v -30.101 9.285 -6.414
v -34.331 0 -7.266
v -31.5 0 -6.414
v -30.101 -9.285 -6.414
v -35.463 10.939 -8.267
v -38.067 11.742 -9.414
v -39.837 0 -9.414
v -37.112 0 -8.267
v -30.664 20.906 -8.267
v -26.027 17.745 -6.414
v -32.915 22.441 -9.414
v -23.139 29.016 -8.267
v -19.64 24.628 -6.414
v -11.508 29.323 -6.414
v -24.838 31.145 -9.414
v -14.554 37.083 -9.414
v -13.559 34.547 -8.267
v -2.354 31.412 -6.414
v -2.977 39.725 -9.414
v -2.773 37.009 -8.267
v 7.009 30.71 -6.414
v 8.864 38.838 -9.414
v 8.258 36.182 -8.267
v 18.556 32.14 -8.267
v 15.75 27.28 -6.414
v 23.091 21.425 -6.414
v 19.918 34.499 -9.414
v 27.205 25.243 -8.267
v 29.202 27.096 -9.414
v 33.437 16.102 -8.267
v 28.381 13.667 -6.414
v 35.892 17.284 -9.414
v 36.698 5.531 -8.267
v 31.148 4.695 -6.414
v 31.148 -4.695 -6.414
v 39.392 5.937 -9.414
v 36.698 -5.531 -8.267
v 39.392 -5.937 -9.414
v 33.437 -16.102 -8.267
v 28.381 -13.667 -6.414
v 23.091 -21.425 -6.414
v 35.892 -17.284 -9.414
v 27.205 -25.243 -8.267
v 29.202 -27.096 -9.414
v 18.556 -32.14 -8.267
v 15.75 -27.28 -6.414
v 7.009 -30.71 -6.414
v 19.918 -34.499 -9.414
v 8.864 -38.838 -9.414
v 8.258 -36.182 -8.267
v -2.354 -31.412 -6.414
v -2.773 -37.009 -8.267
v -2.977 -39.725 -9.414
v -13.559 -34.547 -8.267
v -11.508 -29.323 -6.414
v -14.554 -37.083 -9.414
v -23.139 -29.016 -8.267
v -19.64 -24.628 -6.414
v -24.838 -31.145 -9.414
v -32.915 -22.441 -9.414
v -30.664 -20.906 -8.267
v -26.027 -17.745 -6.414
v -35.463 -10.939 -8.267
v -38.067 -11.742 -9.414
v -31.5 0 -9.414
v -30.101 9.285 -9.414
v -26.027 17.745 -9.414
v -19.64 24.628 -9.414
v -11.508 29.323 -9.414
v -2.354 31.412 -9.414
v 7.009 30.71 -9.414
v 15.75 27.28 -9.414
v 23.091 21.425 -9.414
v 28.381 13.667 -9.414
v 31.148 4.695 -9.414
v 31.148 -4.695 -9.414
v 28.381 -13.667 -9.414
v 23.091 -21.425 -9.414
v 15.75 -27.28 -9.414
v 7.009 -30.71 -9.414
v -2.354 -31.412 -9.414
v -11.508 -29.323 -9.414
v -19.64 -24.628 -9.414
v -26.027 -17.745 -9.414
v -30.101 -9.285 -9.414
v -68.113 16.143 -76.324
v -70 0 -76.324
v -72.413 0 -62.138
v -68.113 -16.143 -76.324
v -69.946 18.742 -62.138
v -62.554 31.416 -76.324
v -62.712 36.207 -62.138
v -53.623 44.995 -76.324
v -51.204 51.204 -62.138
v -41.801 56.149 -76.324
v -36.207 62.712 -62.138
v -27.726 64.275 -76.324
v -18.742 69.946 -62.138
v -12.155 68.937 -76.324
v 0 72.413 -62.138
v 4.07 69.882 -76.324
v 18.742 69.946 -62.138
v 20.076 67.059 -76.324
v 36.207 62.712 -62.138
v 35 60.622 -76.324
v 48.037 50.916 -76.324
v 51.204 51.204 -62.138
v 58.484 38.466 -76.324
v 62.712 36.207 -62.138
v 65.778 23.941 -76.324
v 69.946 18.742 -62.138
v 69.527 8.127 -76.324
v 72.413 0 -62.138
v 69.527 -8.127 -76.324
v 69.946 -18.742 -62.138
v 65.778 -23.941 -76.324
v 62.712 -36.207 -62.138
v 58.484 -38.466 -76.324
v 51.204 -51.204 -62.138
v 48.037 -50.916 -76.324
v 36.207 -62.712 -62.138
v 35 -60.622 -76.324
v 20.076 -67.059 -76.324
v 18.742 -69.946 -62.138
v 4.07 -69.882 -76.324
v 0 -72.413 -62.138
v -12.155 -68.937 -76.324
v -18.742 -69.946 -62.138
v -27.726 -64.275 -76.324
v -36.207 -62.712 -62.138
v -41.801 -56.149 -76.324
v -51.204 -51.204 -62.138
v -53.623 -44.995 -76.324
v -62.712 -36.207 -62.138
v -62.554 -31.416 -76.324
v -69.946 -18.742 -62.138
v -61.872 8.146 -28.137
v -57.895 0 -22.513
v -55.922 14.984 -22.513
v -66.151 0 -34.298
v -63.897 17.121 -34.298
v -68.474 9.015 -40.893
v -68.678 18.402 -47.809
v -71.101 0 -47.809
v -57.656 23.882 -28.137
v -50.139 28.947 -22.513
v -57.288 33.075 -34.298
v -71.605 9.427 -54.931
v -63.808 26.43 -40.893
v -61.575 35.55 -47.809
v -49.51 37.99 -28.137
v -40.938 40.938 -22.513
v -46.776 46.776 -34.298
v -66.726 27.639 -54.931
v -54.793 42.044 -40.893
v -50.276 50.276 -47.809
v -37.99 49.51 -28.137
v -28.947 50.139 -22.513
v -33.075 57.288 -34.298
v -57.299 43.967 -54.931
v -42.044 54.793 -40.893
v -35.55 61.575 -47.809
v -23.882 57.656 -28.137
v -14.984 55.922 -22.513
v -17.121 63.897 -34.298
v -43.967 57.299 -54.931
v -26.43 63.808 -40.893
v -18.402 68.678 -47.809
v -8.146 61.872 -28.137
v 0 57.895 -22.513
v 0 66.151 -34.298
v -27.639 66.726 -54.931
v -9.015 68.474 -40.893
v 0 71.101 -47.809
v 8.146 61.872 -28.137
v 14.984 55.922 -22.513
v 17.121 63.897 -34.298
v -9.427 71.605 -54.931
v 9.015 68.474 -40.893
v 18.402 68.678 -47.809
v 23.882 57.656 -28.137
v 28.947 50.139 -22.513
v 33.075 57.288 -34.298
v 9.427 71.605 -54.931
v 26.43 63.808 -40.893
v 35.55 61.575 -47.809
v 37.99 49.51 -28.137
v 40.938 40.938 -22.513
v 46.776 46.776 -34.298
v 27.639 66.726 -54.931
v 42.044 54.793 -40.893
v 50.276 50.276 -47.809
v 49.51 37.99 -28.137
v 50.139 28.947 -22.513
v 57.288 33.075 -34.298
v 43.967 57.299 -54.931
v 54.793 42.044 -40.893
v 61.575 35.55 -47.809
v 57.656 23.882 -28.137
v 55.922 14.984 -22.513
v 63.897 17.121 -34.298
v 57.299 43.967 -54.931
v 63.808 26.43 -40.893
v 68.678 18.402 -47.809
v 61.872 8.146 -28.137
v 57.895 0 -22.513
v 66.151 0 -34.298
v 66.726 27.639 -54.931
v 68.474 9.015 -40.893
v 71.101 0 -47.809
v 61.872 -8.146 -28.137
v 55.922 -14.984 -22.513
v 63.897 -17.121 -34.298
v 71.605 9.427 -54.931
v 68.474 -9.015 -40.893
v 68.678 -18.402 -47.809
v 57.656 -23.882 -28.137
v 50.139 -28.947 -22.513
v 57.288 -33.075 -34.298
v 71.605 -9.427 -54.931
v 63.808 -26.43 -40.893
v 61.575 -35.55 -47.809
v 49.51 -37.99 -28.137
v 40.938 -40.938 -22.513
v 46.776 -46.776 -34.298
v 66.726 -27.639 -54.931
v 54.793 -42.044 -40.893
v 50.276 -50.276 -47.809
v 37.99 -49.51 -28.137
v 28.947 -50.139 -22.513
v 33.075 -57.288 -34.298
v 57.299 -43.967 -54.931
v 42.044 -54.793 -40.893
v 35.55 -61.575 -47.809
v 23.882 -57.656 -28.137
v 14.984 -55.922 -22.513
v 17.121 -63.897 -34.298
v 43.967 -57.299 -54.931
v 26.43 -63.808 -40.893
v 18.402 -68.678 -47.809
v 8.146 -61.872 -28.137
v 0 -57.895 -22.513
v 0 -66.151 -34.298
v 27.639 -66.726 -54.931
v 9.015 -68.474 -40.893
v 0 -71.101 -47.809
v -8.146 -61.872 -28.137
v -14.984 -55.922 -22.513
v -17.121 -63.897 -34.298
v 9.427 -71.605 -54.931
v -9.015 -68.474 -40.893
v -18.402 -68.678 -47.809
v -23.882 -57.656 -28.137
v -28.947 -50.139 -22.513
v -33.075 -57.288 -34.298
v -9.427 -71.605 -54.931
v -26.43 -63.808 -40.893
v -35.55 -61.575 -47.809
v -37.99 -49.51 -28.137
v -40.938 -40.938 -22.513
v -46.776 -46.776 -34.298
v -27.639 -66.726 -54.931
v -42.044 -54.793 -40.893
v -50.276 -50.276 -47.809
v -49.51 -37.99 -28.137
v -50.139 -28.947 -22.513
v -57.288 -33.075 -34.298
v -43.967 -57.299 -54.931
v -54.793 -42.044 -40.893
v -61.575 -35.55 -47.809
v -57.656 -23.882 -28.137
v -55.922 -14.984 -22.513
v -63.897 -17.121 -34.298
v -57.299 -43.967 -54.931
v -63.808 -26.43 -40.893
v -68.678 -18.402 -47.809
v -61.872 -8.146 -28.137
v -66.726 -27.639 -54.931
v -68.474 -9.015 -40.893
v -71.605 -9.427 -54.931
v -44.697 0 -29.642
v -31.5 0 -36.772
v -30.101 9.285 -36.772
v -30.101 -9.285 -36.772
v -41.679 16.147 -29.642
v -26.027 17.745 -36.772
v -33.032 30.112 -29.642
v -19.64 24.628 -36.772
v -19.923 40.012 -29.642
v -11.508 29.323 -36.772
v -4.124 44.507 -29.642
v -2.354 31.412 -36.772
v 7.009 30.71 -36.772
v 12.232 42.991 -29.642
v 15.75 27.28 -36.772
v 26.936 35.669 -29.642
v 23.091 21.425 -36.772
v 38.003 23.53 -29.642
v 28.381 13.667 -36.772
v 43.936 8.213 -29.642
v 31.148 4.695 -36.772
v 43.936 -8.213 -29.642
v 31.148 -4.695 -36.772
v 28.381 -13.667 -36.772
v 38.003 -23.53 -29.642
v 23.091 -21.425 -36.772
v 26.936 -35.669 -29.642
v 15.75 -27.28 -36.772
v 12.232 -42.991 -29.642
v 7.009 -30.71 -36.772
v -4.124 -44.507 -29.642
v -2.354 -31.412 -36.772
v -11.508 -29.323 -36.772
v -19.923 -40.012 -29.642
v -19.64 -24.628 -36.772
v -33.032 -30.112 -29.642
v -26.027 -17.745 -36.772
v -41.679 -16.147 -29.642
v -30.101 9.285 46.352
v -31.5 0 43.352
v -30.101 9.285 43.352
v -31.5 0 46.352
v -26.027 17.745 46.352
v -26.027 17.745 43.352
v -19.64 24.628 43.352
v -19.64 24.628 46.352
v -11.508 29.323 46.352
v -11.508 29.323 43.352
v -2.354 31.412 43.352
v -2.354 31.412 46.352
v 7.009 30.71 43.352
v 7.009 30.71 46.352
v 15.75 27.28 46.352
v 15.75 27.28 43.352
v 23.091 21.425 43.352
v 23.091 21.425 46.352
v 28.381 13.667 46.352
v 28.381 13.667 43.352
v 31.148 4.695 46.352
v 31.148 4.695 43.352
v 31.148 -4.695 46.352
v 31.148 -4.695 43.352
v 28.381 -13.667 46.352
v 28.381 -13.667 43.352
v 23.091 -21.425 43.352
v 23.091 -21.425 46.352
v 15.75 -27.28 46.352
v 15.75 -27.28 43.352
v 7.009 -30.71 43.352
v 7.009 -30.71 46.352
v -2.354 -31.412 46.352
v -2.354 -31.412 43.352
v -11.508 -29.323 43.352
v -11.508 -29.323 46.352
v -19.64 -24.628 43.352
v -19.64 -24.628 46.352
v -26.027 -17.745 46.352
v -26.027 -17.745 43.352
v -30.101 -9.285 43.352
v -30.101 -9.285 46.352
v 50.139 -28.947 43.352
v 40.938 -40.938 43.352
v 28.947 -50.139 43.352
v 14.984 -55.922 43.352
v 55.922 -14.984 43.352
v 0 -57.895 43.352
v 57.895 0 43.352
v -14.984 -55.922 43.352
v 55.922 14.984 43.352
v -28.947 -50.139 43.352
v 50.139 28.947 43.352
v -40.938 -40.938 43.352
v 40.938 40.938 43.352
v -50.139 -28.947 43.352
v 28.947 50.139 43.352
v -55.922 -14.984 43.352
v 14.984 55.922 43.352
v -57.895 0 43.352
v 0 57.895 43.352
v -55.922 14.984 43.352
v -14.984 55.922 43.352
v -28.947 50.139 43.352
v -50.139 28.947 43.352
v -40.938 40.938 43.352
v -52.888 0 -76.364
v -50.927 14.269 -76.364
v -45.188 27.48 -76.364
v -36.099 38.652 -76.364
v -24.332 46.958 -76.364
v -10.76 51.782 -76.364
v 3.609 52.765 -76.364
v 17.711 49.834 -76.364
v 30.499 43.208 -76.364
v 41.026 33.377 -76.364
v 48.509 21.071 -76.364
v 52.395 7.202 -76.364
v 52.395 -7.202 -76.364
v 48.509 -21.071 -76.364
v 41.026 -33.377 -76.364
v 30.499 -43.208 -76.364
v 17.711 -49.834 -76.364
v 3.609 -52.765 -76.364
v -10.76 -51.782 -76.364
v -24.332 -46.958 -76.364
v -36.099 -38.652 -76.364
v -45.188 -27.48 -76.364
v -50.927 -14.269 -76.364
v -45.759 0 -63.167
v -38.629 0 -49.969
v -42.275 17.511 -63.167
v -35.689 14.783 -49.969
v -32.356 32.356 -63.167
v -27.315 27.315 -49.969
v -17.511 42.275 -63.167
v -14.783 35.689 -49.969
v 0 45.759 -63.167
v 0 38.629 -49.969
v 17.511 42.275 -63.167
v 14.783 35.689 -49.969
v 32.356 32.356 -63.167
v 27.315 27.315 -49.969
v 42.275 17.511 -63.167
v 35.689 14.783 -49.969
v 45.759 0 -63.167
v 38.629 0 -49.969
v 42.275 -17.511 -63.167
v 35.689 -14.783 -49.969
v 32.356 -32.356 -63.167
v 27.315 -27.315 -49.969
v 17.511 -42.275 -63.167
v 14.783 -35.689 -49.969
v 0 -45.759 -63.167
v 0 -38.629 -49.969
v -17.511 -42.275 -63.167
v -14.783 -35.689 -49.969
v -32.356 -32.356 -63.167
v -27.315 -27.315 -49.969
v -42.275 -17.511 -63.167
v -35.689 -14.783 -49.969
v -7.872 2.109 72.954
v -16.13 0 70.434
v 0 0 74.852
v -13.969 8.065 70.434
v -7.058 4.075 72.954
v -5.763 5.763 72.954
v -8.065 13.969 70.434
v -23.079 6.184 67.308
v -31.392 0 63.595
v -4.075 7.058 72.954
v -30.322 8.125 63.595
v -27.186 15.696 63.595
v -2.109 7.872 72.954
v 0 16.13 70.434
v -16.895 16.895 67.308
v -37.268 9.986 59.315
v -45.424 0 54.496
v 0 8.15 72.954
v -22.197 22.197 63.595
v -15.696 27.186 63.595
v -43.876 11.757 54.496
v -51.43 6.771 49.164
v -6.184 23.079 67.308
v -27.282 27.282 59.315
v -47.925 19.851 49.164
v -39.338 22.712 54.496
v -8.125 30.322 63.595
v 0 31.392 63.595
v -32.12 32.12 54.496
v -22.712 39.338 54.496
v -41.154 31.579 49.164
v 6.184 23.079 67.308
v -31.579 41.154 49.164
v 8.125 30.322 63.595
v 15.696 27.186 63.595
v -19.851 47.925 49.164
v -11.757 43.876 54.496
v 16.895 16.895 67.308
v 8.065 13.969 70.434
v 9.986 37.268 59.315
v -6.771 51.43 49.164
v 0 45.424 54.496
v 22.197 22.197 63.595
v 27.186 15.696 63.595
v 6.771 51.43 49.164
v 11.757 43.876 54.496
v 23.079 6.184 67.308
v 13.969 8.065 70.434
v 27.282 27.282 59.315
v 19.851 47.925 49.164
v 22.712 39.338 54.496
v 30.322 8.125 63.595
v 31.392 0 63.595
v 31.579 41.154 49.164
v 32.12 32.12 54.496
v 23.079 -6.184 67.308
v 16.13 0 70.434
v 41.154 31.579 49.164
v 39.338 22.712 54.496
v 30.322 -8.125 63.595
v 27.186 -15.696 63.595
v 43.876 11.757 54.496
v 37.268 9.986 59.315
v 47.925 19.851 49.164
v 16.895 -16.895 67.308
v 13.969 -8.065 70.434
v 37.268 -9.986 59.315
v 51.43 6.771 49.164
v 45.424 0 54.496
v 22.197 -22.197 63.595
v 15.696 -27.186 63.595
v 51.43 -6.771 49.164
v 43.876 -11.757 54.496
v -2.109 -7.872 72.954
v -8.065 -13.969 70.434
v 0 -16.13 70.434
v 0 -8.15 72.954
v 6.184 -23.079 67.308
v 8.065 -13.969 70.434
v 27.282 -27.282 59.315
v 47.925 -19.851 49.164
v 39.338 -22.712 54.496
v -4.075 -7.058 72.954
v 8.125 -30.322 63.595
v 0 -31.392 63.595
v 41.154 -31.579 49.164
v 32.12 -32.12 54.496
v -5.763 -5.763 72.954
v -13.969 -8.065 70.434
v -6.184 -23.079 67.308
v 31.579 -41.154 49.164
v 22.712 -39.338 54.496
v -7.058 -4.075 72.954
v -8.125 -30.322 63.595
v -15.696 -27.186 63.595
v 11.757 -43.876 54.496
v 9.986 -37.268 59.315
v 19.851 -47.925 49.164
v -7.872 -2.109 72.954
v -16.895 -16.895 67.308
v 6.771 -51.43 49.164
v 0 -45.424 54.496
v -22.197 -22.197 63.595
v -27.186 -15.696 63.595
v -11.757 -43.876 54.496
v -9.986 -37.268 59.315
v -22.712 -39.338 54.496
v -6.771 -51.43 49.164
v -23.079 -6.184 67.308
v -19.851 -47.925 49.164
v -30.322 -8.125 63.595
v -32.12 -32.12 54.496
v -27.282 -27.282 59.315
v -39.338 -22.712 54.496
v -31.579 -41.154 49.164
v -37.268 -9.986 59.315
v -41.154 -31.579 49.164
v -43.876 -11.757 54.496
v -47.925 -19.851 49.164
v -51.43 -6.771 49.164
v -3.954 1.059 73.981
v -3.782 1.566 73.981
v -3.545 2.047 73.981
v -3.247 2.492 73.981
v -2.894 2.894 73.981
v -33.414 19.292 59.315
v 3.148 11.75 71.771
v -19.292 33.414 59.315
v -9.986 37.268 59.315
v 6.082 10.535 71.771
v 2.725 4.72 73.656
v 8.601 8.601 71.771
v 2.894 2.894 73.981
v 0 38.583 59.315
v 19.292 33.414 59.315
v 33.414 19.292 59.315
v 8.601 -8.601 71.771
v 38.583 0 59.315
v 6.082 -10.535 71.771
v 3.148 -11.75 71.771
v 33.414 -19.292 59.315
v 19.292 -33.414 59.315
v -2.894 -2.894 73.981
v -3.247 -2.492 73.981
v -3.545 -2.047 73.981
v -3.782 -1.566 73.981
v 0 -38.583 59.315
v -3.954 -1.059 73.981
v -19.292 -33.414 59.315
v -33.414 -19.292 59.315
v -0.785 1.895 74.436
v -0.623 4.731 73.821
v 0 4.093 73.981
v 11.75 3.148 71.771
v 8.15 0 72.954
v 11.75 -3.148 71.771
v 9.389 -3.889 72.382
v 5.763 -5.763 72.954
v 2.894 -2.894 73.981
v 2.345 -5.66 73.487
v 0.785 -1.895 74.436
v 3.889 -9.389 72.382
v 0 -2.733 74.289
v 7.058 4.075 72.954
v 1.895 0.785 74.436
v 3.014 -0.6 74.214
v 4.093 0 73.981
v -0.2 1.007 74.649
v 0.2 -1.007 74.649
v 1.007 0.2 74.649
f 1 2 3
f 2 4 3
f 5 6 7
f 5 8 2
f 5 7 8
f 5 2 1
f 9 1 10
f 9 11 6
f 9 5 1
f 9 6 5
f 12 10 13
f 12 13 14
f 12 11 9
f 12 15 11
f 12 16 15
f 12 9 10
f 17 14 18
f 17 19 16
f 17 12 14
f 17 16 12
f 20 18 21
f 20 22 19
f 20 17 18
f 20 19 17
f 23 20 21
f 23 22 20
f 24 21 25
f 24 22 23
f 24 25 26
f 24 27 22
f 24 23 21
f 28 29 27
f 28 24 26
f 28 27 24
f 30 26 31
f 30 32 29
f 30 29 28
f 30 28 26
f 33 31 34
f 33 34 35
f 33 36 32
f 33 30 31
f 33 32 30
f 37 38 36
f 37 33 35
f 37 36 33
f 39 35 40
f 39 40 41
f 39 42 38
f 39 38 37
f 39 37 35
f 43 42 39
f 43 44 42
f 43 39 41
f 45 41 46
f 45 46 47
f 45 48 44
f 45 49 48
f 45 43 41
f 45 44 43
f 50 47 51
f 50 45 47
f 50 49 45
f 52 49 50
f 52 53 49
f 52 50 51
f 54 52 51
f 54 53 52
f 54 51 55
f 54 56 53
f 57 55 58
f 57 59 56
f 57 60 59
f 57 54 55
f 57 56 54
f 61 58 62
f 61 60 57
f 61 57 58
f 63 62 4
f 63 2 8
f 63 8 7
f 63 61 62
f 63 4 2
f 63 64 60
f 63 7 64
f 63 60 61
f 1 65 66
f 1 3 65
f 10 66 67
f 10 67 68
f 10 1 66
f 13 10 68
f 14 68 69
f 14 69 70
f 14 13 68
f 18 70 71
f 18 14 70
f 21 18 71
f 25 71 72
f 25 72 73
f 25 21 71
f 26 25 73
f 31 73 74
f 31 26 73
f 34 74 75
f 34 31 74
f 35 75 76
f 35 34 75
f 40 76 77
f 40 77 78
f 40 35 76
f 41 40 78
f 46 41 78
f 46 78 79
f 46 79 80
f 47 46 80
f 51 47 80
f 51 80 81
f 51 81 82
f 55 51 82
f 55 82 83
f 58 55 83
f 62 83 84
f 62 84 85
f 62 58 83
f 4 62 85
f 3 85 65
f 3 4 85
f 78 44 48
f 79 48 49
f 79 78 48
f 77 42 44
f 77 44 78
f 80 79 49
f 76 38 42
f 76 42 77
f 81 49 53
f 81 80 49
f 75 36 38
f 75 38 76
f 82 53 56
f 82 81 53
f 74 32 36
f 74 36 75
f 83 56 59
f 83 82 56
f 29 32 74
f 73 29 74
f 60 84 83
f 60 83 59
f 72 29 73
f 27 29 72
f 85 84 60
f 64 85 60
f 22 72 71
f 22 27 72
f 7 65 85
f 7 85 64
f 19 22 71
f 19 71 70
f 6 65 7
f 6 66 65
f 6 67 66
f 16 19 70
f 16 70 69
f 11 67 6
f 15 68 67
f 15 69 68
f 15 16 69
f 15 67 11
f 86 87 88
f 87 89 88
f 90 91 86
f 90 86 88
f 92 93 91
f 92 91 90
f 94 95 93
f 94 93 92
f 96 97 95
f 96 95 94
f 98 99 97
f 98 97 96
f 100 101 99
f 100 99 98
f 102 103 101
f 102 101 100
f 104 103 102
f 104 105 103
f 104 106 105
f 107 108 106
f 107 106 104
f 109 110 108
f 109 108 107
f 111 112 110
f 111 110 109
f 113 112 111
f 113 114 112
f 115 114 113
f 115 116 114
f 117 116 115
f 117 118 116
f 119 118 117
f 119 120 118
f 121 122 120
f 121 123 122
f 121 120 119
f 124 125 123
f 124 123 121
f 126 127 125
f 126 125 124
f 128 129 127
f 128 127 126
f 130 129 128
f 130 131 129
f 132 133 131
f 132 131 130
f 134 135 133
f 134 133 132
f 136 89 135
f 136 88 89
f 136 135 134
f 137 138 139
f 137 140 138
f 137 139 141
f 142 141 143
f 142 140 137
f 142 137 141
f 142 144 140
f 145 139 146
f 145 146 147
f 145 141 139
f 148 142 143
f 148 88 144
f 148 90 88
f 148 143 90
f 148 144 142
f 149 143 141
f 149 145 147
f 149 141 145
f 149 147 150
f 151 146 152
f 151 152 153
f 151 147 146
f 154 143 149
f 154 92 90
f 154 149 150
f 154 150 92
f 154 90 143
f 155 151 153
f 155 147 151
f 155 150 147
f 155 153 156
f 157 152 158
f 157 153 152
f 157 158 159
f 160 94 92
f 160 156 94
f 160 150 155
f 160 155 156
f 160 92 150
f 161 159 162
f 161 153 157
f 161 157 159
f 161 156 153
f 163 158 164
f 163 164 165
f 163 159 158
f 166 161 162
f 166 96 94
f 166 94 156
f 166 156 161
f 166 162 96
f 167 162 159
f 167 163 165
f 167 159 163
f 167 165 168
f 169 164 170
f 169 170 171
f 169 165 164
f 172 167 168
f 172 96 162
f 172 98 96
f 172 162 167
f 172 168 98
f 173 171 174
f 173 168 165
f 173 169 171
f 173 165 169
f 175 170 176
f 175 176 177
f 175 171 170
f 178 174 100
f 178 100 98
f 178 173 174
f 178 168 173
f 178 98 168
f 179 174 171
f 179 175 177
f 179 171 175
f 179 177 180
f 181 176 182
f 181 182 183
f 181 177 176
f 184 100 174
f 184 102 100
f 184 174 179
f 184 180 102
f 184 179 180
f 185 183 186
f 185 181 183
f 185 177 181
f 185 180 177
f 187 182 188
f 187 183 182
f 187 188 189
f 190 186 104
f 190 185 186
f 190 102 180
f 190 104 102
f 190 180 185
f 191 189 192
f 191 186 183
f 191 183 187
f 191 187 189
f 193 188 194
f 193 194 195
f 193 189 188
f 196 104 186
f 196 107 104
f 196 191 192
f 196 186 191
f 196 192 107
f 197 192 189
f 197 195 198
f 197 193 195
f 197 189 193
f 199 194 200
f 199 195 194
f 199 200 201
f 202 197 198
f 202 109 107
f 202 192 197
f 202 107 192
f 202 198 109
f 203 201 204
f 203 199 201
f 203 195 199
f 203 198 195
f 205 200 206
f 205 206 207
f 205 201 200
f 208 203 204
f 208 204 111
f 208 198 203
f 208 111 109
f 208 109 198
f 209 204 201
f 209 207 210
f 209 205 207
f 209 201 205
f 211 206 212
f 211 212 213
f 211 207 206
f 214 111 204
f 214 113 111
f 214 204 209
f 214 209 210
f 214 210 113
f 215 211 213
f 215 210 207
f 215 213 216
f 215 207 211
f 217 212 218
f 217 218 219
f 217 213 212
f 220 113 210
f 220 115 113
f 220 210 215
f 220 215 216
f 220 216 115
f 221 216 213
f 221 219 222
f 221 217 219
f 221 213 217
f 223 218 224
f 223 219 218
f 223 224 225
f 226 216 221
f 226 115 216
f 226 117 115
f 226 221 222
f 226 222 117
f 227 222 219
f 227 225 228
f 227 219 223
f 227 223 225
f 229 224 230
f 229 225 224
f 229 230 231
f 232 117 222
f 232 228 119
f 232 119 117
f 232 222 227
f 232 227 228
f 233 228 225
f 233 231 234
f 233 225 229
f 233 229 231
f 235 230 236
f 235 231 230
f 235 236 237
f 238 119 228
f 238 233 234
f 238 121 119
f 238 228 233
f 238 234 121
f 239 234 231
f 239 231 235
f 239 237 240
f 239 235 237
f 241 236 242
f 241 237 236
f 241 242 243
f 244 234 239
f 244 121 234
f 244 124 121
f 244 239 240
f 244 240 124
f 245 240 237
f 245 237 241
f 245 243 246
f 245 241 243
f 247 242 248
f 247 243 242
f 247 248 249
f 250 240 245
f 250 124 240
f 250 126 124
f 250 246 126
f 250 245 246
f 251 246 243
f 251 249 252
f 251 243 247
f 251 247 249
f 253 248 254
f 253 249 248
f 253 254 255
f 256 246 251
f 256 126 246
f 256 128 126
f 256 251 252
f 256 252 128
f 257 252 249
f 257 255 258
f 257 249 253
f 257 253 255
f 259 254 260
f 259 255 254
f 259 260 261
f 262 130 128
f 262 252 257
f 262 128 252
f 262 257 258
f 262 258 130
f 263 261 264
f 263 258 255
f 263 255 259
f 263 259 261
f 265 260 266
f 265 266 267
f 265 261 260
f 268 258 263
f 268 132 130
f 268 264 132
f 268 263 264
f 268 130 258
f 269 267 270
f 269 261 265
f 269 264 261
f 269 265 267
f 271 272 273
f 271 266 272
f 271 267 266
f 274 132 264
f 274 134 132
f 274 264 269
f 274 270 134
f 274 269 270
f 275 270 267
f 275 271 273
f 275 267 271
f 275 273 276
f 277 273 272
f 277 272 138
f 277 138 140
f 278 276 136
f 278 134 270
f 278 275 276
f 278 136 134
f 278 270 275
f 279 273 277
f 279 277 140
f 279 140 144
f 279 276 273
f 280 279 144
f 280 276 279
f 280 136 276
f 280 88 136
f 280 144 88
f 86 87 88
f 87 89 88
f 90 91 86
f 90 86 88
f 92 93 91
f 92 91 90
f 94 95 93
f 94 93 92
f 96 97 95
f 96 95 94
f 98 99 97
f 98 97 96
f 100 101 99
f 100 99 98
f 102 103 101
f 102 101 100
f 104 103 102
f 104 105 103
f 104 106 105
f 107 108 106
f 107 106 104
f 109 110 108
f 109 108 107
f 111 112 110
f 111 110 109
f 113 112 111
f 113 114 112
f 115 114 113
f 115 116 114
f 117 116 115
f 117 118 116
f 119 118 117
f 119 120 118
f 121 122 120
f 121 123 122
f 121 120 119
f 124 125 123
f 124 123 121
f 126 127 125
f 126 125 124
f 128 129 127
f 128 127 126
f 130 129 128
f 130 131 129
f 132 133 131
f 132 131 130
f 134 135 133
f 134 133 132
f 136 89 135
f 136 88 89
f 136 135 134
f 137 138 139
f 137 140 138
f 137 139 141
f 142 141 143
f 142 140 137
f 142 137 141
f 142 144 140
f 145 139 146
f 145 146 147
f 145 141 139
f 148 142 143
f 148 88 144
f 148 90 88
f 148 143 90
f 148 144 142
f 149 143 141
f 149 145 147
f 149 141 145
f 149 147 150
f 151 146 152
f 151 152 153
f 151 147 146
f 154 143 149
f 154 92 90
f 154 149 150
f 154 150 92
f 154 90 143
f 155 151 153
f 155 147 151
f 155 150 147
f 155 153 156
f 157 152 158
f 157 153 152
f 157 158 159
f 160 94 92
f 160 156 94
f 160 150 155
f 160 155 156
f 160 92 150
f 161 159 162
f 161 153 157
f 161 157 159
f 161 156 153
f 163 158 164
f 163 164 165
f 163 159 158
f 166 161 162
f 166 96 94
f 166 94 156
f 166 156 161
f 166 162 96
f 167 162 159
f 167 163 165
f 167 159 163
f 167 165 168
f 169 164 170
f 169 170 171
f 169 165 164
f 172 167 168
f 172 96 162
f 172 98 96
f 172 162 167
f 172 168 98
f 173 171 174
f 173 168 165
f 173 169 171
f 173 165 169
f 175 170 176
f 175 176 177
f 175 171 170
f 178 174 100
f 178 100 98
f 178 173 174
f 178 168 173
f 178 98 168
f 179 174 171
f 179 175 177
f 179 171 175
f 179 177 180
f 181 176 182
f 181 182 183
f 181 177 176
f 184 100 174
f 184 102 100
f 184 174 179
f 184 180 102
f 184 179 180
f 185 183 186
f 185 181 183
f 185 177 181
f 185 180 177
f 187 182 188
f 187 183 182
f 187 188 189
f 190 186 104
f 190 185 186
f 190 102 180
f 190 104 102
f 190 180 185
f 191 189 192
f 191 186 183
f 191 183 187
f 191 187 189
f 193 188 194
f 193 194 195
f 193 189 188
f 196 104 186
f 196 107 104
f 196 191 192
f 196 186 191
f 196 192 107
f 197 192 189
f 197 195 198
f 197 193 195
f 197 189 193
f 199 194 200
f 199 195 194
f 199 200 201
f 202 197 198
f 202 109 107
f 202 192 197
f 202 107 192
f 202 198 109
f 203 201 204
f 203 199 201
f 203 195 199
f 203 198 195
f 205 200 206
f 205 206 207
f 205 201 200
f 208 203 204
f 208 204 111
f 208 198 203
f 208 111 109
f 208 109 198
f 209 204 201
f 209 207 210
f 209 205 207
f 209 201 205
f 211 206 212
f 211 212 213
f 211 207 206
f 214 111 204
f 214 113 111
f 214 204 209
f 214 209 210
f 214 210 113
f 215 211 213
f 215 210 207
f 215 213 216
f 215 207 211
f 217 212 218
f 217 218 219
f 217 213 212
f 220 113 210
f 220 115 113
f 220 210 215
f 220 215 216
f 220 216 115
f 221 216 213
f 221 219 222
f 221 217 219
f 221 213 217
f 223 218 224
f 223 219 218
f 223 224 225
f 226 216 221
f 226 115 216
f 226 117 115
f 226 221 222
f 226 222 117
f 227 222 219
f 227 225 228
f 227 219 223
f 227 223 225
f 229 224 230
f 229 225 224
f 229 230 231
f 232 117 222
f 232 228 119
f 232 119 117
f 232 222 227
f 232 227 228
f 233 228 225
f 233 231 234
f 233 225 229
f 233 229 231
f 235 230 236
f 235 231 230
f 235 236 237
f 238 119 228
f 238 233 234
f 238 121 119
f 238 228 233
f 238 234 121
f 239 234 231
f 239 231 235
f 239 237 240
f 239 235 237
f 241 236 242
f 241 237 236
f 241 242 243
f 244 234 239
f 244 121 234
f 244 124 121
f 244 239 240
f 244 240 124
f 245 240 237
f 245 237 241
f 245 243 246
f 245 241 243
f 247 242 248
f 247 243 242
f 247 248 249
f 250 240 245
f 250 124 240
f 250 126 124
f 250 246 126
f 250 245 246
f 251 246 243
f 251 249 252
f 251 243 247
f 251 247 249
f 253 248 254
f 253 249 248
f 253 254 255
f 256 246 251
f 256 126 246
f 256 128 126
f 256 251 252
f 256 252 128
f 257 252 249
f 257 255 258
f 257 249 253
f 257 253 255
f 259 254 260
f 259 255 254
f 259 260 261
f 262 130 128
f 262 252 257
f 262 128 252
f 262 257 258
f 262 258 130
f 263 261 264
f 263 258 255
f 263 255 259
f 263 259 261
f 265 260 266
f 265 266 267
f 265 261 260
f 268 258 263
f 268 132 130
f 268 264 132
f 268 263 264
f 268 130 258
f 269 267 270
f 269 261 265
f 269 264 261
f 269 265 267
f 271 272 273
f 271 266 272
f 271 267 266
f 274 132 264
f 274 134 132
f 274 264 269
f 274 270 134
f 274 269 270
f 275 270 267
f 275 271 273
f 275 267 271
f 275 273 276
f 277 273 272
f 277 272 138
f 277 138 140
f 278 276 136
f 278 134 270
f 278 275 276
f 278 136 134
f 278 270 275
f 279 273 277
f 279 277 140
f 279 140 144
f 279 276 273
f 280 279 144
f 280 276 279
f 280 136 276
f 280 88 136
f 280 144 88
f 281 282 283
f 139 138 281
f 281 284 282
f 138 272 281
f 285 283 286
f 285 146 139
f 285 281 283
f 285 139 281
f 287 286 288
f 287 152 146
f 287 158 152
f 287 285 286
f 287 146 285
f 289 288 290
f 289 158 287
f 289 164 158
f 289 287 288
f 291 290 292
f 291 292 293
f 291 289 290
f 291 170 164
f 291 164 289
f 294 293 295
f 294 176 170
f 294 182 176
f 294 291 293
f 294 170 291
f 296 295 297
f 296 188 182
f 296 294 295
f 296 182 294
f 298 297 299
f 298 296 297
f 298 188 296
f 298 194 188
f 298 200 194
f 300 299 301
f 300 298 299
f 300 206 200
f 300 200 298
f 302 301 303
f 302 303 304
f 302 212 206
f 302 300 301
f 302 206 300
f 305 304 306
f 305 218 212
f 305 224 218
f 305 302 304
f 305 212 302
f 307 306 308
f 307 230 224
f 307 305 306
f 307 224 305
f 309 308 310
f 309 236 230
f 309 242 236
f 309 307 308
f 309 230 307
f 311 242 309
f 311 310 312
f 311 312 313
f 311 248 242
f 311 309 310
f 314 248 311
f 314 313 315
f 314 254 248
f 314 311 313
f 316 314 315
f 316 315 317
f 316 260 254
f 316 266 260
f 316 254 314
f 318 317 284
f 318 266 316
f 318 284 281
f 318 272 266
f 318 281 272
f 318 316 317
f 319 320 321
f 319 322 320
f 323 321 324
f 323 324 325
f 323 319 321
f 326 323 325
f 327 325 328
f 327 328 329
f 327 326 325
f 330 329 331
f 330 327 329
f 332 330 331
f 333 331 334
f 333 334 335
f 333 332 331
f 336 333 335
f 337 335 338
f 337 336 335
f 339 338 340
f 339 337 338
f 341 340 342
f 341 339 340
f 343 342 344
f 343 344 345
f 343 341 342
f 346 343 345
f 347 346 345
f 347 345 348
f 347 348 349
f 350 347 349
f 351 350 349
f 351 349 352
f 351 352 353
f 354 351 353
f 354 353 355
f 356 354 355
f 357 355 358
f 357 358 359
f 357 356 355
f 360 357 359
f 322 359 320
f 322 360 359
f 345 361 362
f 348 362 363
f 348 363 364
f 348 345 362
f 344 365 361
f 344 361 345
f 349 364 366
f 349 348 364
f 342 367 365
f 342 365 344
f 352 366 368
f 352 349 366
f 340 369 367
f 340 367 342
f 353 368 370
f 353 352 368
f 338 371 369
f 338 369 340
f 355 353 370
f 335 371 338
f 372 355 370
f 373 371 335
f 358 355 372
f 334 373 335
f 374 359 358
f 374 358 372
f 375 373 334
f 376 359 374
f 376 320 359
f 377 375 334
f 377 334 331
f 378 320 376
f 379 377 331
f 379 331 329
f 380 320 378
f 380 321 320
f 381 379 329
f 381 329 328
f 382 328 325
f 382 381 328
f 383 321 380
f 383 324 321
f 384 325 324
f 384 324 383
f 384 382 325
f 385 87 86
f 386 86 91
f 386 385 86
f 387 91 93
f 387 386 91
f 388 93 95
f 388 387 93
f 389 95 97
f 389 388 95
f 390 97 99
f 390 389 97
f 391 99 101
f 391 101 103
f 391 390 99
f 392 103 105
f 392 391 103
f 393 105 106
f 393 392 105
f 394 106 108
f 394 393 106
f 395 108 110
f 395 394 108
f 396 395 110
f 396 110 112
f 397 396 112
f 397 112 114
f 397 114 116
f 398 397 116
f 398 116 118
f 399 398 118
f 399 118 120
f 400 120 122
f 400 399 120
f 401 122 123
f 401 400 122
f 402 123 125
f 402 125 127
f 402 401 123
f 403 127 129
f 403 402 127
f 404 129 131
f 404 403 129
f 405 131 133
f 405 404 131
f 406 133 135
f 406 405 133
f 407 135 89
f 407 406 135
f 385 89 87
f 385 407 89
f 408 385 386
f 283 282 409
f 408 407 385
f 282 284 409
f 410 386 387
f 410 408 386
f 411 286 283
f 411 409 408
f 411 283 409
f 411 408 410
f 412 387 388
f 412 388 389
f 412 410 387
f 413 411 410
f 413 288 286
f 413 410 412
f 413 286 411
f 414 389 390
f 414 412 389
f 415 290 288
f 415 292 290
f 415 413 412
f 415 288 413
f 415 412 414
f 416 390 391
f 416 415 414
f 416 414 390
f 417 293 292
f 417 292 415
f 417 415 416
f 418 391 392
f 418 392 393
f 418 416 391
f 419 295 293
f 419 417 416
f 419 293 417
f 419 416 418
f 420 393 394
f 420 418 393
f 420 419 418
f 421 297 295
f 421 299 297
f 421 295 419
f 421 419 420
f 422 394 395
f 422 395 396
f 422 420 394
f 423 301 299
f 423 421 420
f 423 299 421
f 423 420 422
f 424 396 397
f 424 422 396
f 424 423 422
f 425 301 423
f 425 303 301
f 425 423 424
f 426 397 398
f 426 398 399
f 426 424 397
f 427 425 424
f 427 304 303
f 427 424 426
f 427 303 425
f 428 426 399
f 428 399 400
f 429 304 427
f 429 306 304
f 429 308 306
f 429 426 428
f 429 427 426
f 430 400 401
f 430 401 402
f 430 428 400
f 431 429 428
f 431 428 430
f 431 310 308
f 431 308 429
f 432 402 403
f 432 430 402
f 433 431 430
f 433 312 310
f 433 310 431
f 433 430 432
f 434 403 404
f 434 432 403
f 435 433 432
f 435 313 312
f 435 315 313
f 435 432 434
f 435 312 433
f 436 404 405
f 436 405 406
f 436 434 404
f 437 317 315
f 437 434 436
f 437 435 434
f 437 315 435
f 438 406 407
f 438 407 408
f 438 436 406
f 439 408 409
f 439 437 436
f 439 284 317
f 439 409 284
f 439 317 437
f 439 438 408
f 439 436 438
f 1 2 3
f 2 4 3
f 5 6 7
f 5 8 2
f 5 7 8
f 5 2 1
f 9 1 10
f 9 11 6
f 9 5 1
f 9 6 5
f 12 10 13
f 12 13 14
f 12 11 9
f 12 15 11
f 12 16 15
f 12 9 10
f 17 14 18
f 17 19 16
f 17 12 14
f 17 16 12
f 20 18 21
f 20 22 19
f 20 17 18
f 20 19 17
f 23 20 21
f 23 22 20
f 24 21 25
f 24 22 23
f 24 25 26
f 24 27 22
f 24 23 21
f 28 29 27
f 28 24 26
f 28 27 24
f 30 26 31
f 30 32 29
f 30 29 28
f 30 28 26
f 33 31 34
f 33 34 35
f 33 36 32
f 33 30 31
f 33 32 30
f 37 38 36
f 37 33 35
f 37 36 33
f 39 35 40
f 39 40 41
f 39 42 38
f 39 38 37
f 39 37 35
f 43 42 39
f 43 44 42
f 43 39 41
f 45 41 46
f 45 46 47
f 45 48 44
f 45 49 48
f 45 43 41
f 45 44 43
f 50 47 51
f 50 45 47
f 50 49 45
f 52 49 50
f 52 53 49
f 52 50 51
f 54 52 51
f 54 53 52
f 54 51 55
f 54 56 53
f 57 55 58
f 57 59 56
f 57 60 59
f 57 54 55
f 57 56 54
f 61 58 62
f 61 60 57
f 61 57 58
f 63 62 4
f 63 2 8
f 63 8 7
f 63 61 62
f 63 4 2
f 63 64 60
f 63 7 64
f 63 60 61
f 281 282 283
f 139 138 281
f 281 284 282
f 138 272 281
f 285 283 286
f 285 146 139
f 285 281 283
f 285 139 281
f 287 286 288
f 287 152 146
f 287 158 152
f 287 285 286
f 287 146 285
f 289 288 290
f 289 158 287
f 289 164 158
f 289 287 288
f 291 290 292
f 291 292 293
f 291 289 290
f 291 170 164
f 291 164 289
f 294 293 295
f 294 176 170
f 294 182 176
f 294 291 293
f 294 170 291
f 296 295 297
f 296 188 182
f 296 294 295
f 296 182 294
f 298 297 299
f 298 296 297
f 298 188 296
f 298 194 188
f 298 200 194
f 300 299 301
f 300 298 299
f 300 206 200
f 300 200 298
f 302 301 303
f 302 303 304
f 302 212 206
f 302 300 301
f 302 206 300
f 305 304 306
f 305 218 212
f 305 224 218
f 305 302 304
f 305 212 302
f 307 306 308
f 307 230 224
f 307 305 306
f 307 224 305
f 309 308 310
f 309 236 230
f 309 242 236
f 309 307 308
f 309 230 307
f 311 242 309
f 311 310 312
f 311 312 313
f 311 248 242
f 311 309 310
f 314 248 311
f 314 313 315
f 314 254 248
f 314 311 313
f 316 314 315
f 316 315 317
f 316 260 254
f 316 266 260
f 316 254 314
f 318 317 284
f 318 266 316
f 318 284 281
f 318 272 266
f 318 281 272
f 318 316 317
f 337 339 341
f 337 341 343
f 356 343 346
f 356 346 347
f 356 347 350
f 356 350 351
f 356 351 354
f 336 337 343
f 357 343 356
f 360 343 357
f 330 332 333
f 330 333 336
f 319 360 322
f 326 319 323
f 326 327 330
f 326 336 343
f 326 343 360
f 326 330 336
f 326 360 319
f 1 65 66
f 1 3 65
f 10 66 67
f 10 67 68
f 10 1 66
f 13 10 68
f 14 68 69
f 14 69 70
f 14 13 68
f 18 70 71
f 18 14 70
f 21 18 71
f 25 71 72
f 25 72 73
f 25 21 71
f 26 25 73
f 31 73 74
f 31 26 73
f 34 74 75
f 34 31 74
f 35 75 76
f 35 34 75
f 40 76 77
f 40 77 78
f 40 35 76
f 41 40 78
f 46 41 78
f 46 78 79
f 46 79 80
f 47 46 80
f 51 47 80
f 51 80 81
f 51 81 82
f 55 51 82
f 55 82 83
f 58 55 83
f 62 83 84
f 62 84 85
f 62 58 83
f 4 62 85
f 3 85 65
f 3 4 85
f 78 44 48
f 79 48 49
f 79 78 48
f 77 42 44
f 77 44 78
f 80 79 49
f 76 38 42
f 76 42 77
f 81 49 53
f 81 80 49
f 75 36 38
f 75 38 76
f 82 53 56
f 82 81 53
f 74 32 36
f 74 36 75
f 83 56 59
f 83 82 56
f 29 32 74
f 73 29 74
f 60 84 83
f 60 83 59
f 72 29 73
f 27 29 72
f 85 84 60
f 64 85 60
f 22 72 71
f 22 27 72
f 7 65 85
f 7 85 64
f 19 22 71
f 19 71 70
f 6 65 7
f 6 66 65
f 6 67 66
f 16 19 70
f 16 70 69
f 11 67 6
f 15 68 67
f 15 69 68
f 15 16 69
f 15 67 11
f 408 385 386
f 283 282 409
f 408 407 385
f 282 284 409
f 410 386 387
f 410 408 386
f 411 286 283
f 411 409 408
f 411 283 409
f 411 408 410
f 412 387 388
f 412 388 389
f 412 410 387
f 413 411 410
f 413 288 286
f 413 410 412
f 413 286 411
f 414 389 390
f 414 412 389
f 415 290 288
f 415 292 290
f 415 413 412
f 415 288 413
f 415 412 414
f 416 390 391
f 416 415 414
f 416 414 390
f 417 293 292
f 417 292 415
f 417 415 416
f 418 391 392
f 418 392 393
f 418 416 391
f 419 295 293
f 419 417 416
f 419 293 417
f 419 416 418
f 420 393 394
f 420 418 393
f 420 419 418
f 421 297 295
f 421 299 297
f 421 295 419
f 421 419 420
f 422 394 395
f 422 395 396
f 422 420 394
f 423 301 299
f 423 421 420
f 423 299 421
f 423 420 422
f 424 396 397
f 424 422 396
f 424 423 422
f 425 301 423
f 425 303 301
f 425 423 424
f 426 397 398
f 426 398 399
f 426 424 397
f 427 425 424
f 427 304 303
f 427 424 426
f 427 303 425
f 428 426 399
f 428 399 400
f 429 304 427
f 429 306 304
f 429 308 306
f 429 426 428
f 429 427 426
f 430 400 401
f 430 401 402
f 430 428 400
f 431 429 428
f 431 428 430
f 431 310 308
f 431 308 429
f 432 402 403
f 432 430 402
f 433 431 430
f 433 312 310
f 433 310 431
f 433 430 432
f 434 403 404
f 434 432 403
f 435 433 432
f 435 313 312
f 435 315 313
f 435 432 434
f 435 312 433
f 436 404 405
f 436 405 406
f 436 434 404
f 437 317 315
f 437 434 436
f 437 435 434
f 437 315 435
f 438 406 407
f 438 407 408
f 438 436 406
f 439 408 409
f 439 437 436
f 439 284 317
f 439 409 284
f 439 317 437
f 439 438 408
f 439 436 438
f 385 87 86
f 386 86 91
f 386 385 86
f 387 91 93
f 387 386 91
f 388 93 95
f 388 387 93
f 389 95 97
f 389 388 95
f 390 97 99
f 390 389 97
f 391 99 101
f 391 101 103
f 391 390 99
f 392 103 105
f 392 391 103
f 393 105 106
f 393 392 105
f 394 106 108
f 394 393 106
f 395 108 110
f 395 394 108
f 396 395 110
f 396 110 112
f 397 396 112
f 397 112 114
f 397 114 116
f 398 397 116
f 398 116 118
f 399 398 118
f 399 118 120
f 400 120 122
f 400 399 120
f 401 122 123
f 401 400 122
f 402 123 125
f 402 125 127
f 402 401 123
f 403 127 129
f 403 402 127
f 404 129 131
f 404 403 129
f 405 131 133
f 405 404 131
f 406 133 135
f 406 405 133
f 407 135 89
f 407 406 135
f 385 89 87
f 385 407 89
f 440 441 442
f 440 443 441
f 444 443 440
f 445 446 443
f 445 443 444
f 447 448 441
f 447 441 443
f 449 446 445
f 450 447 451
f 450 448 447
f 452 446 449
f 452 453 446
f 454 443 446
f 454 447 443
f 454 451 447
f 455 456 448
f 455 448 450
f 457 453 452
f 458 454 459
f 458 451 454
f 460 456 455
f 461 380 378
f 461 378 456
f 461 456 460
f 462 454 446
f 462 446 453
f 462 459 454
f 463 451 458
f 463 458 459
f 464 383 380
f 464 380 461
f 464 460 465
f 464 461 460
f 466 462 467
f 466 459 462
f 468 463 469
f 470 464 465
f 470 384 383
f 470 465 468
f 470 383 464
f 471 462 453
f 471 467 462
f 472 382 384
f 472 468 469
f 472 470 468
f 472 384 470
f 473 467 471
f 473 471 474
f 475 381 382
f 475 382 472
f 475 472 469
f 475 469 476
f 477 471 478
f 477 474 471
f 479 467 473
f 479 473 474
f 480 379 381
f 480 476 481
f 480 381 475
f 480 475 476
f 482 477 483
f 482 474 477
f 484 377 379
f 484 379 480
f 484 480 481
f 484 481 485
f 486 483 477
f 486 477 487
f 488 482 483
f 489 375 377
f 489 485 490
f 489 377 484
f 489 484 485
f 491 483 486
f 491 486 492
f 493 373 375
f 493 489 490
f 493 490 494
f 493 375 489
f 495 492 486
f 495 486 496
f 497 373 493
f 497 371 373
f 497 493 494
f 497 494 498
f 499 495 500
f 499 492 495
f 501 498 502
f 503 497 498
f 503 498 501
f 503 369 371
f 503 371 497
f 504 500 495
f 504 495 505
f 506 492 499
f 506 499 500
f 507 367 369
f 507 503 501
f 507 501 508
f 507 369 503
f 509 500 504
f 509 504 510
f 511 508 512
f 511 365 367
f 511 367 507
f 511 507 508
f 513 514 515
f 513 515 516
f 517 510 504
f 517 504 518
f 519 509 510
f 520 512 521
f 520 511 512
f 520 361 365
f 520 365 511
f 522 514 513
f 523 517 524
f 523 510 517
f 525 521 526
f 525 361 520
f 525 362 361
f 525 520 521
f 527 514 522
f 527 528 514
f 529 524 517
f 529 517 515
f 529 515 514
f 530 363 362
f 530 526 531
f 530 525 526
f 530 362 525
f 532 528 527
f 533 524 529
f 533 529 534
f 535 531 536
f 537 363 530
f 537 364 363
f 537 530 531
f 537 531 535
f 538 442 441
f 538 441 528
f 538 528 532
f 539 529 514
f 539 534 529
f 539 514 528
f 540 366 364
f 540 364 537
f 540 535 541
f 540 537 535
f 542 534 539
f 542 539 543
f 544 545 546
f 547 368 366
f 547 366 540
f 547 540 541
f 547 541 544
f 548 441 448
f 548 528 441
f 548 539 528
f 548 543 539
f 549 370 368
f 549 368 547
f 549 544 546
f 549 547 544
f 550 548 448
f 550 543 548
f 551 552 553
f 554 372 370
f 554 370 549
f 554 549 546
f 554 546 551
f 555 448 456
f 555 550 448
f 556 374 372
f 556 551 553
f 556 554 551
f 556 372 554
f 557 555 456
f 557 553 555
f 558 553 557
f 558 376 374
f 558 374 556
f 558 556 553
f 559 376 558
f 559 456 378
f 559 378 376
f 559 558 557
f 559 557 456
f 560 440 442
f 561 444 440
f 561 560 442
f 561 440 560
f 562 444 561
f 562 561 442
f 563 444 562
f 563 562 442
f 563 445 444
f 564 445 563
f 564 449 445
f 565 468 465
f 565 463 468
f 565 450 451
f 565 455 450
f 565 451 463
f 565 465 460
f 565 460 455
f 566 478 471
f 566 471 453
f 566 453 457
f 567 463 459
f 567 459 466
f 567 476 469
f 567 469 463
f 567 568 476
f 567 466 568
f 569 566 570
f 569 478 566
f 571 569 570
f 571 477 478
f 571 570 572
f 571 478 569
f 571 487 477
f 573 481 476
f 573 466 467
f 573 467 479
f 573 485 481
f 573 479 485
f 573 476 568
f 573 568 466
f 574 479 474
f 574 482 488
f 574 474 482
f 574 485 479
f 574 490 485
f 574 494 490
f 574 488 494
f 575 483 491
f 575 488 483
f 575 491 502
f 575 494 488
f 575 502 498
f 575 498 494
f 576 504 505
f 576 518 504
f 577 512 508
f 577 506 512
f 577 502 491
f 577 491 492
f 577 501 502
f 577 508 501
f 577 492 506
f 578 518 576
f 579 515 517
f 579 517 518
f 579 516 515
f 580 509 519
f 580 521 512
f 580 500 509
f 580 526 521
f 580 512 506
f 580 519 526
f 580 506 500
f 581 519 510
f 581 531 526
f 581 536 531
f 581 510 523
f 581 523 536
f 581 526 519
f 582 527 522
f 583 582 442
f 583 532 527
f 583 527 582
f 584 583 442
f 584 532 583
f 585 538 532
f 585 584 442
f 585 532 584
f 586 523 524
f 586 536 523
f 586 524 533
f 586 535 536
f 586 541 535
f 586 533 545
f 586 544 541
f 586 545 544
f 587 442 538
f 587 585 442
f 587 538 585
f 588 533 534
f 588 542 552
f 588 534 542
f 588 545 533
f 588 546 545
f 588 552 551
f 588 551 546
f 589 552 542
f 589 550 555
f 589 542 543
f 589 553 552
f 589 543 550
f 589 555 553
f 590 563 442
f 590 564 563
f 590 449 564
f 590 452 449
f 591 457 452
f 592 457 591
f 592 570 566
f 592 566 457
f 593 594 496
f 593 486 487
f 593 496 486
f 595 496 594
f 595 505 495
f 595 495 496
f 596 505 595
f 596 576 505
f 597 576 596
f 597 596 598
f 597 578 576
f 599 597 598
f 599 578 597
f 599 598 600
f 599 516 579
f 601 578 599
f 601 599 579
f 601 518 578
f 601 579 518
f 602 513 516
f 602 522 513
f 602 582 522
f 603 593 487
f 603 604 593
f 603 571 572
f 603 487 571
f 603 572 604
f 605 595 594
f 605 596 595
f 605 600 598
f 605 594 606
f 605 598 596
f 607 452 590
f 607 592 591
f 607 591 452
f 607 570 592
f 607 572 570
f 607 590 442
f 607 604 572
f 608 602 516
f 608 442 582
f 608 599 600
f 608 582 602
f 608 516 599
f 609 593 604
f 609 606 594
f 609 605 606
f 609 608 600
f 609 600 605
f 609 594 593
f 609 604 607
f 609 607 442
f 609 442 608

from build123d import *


# Not quite as in the source:
# - the program builds the solid bodies; features that only make, move or delete a surface that nothing else refers to are left out


with BuildPart() as f1:
    # F0 (on Front) → F1 (revolve)
    with BuildSketch(Plane.XZ):
        with BuildLine():
            Line((-31.5, -36.7715619504), (-57.8949571854, -22.5130124036))
            ThreePointArc((-57.8949571854, -22.5130124036), (-71.100893869, -47.8091979463), (-70, -76.3237871839))
            Line((-70, -76.3237871839), (-52.8878243203, -76.3639977286))
            Line((-52.8878243203, -76.3639977286), (-31.5, -36.7715619504))
        make_face()
    revolve(axis=Axis((0, 0, -0.7809376717), (0, 0, -1)))


with BuildPart() as f3:
    # F0 (on Front) → F3 (revolve)
    with BuildSketch(Plane.XZ):
        with BuildLine():
            Line((-31.5, -9.4140620232), (-31.5, -6.4140620232))
            ThreePointArc((-31.5, -6.4140620232), (-35.7282093513, -7.7475284985), (-39.836560988, -9.4140620232))
            Line((-39.836560988, -9.4140620232), (-31.5, -9.4140620232))
        make_face()
    revolve(axis=Axis((0, 0, -0.7809376717), (0, 0, -1)))


with BuildPart() as f3b:
    # F0 (on Front) → F3, piece 2 (revolve)
    with BuildSketch(Plane.XZ):
        with BuildLine():
            Line((-31.5, -36.7715619504), (-57.8949571854, -22.5130124036))
            ThreePointArc((-57.8949571854, -22.5130124036), (-71.100893869, -47.8091979463), (-70, -76.3237871839))
            Line((-70, -76.3237871839), (-52.8878243203, -76.3639977286))
            Line((-52.8878243203, -76.3639977286), (-31.5, -36.7715619504))
        make_face()
    revolve(axis=Axis((0, 0, -0.7809376717), (0, 0, -1)))


with BuildPart() as f3c:
    # F0 (on Front) → F3, piece 3 (revolve)
    with BuildSketch(Plane.XZ):
        with BuildLine():
            Line((0, 46.3521866798), (0, 74.8521866798))
            ThreePointArc((0, 74.8521866798), (-31.3917968408, 63.5946851026), (-57.8949571854, 43.3521866798))
            Line((-57.8949571854, 43.3521866798), (-31.5, 43.3521866798))
            Line((-31.5, 43.3521866798), (-31.5, 46.3521866798))
            Line((-31.5, 46.3521866798), (0, 46.3521866798))
        make_face()
    revolve(axis=Axis((0, 0, -0.7809376717), (0, 0, -1)))


with BuildPart() as f4:
    # F0 (on Front) → F4 (revolve)
    with BuildSketch(Plane.XZ):
        with BuildLine():
            Line((-31.5, -9.4140620232), (-31.5, -6.4140620232))
            ThreePointArc((-31.5, -6.4140620232), (-35.7282093513, -7.7475284985), (-39.836560988, -9.4140620232))
            Line((-39.836560988, -9.4140620232), (-31.5, -9.4140620232))
        make_face()
    revolve(axis=Axis((0, 0, -0.7809376717), (0, 0, -1)))


solid = Compound([f1.part, f3.part, f3b.part, f3c.part, f4.part])
